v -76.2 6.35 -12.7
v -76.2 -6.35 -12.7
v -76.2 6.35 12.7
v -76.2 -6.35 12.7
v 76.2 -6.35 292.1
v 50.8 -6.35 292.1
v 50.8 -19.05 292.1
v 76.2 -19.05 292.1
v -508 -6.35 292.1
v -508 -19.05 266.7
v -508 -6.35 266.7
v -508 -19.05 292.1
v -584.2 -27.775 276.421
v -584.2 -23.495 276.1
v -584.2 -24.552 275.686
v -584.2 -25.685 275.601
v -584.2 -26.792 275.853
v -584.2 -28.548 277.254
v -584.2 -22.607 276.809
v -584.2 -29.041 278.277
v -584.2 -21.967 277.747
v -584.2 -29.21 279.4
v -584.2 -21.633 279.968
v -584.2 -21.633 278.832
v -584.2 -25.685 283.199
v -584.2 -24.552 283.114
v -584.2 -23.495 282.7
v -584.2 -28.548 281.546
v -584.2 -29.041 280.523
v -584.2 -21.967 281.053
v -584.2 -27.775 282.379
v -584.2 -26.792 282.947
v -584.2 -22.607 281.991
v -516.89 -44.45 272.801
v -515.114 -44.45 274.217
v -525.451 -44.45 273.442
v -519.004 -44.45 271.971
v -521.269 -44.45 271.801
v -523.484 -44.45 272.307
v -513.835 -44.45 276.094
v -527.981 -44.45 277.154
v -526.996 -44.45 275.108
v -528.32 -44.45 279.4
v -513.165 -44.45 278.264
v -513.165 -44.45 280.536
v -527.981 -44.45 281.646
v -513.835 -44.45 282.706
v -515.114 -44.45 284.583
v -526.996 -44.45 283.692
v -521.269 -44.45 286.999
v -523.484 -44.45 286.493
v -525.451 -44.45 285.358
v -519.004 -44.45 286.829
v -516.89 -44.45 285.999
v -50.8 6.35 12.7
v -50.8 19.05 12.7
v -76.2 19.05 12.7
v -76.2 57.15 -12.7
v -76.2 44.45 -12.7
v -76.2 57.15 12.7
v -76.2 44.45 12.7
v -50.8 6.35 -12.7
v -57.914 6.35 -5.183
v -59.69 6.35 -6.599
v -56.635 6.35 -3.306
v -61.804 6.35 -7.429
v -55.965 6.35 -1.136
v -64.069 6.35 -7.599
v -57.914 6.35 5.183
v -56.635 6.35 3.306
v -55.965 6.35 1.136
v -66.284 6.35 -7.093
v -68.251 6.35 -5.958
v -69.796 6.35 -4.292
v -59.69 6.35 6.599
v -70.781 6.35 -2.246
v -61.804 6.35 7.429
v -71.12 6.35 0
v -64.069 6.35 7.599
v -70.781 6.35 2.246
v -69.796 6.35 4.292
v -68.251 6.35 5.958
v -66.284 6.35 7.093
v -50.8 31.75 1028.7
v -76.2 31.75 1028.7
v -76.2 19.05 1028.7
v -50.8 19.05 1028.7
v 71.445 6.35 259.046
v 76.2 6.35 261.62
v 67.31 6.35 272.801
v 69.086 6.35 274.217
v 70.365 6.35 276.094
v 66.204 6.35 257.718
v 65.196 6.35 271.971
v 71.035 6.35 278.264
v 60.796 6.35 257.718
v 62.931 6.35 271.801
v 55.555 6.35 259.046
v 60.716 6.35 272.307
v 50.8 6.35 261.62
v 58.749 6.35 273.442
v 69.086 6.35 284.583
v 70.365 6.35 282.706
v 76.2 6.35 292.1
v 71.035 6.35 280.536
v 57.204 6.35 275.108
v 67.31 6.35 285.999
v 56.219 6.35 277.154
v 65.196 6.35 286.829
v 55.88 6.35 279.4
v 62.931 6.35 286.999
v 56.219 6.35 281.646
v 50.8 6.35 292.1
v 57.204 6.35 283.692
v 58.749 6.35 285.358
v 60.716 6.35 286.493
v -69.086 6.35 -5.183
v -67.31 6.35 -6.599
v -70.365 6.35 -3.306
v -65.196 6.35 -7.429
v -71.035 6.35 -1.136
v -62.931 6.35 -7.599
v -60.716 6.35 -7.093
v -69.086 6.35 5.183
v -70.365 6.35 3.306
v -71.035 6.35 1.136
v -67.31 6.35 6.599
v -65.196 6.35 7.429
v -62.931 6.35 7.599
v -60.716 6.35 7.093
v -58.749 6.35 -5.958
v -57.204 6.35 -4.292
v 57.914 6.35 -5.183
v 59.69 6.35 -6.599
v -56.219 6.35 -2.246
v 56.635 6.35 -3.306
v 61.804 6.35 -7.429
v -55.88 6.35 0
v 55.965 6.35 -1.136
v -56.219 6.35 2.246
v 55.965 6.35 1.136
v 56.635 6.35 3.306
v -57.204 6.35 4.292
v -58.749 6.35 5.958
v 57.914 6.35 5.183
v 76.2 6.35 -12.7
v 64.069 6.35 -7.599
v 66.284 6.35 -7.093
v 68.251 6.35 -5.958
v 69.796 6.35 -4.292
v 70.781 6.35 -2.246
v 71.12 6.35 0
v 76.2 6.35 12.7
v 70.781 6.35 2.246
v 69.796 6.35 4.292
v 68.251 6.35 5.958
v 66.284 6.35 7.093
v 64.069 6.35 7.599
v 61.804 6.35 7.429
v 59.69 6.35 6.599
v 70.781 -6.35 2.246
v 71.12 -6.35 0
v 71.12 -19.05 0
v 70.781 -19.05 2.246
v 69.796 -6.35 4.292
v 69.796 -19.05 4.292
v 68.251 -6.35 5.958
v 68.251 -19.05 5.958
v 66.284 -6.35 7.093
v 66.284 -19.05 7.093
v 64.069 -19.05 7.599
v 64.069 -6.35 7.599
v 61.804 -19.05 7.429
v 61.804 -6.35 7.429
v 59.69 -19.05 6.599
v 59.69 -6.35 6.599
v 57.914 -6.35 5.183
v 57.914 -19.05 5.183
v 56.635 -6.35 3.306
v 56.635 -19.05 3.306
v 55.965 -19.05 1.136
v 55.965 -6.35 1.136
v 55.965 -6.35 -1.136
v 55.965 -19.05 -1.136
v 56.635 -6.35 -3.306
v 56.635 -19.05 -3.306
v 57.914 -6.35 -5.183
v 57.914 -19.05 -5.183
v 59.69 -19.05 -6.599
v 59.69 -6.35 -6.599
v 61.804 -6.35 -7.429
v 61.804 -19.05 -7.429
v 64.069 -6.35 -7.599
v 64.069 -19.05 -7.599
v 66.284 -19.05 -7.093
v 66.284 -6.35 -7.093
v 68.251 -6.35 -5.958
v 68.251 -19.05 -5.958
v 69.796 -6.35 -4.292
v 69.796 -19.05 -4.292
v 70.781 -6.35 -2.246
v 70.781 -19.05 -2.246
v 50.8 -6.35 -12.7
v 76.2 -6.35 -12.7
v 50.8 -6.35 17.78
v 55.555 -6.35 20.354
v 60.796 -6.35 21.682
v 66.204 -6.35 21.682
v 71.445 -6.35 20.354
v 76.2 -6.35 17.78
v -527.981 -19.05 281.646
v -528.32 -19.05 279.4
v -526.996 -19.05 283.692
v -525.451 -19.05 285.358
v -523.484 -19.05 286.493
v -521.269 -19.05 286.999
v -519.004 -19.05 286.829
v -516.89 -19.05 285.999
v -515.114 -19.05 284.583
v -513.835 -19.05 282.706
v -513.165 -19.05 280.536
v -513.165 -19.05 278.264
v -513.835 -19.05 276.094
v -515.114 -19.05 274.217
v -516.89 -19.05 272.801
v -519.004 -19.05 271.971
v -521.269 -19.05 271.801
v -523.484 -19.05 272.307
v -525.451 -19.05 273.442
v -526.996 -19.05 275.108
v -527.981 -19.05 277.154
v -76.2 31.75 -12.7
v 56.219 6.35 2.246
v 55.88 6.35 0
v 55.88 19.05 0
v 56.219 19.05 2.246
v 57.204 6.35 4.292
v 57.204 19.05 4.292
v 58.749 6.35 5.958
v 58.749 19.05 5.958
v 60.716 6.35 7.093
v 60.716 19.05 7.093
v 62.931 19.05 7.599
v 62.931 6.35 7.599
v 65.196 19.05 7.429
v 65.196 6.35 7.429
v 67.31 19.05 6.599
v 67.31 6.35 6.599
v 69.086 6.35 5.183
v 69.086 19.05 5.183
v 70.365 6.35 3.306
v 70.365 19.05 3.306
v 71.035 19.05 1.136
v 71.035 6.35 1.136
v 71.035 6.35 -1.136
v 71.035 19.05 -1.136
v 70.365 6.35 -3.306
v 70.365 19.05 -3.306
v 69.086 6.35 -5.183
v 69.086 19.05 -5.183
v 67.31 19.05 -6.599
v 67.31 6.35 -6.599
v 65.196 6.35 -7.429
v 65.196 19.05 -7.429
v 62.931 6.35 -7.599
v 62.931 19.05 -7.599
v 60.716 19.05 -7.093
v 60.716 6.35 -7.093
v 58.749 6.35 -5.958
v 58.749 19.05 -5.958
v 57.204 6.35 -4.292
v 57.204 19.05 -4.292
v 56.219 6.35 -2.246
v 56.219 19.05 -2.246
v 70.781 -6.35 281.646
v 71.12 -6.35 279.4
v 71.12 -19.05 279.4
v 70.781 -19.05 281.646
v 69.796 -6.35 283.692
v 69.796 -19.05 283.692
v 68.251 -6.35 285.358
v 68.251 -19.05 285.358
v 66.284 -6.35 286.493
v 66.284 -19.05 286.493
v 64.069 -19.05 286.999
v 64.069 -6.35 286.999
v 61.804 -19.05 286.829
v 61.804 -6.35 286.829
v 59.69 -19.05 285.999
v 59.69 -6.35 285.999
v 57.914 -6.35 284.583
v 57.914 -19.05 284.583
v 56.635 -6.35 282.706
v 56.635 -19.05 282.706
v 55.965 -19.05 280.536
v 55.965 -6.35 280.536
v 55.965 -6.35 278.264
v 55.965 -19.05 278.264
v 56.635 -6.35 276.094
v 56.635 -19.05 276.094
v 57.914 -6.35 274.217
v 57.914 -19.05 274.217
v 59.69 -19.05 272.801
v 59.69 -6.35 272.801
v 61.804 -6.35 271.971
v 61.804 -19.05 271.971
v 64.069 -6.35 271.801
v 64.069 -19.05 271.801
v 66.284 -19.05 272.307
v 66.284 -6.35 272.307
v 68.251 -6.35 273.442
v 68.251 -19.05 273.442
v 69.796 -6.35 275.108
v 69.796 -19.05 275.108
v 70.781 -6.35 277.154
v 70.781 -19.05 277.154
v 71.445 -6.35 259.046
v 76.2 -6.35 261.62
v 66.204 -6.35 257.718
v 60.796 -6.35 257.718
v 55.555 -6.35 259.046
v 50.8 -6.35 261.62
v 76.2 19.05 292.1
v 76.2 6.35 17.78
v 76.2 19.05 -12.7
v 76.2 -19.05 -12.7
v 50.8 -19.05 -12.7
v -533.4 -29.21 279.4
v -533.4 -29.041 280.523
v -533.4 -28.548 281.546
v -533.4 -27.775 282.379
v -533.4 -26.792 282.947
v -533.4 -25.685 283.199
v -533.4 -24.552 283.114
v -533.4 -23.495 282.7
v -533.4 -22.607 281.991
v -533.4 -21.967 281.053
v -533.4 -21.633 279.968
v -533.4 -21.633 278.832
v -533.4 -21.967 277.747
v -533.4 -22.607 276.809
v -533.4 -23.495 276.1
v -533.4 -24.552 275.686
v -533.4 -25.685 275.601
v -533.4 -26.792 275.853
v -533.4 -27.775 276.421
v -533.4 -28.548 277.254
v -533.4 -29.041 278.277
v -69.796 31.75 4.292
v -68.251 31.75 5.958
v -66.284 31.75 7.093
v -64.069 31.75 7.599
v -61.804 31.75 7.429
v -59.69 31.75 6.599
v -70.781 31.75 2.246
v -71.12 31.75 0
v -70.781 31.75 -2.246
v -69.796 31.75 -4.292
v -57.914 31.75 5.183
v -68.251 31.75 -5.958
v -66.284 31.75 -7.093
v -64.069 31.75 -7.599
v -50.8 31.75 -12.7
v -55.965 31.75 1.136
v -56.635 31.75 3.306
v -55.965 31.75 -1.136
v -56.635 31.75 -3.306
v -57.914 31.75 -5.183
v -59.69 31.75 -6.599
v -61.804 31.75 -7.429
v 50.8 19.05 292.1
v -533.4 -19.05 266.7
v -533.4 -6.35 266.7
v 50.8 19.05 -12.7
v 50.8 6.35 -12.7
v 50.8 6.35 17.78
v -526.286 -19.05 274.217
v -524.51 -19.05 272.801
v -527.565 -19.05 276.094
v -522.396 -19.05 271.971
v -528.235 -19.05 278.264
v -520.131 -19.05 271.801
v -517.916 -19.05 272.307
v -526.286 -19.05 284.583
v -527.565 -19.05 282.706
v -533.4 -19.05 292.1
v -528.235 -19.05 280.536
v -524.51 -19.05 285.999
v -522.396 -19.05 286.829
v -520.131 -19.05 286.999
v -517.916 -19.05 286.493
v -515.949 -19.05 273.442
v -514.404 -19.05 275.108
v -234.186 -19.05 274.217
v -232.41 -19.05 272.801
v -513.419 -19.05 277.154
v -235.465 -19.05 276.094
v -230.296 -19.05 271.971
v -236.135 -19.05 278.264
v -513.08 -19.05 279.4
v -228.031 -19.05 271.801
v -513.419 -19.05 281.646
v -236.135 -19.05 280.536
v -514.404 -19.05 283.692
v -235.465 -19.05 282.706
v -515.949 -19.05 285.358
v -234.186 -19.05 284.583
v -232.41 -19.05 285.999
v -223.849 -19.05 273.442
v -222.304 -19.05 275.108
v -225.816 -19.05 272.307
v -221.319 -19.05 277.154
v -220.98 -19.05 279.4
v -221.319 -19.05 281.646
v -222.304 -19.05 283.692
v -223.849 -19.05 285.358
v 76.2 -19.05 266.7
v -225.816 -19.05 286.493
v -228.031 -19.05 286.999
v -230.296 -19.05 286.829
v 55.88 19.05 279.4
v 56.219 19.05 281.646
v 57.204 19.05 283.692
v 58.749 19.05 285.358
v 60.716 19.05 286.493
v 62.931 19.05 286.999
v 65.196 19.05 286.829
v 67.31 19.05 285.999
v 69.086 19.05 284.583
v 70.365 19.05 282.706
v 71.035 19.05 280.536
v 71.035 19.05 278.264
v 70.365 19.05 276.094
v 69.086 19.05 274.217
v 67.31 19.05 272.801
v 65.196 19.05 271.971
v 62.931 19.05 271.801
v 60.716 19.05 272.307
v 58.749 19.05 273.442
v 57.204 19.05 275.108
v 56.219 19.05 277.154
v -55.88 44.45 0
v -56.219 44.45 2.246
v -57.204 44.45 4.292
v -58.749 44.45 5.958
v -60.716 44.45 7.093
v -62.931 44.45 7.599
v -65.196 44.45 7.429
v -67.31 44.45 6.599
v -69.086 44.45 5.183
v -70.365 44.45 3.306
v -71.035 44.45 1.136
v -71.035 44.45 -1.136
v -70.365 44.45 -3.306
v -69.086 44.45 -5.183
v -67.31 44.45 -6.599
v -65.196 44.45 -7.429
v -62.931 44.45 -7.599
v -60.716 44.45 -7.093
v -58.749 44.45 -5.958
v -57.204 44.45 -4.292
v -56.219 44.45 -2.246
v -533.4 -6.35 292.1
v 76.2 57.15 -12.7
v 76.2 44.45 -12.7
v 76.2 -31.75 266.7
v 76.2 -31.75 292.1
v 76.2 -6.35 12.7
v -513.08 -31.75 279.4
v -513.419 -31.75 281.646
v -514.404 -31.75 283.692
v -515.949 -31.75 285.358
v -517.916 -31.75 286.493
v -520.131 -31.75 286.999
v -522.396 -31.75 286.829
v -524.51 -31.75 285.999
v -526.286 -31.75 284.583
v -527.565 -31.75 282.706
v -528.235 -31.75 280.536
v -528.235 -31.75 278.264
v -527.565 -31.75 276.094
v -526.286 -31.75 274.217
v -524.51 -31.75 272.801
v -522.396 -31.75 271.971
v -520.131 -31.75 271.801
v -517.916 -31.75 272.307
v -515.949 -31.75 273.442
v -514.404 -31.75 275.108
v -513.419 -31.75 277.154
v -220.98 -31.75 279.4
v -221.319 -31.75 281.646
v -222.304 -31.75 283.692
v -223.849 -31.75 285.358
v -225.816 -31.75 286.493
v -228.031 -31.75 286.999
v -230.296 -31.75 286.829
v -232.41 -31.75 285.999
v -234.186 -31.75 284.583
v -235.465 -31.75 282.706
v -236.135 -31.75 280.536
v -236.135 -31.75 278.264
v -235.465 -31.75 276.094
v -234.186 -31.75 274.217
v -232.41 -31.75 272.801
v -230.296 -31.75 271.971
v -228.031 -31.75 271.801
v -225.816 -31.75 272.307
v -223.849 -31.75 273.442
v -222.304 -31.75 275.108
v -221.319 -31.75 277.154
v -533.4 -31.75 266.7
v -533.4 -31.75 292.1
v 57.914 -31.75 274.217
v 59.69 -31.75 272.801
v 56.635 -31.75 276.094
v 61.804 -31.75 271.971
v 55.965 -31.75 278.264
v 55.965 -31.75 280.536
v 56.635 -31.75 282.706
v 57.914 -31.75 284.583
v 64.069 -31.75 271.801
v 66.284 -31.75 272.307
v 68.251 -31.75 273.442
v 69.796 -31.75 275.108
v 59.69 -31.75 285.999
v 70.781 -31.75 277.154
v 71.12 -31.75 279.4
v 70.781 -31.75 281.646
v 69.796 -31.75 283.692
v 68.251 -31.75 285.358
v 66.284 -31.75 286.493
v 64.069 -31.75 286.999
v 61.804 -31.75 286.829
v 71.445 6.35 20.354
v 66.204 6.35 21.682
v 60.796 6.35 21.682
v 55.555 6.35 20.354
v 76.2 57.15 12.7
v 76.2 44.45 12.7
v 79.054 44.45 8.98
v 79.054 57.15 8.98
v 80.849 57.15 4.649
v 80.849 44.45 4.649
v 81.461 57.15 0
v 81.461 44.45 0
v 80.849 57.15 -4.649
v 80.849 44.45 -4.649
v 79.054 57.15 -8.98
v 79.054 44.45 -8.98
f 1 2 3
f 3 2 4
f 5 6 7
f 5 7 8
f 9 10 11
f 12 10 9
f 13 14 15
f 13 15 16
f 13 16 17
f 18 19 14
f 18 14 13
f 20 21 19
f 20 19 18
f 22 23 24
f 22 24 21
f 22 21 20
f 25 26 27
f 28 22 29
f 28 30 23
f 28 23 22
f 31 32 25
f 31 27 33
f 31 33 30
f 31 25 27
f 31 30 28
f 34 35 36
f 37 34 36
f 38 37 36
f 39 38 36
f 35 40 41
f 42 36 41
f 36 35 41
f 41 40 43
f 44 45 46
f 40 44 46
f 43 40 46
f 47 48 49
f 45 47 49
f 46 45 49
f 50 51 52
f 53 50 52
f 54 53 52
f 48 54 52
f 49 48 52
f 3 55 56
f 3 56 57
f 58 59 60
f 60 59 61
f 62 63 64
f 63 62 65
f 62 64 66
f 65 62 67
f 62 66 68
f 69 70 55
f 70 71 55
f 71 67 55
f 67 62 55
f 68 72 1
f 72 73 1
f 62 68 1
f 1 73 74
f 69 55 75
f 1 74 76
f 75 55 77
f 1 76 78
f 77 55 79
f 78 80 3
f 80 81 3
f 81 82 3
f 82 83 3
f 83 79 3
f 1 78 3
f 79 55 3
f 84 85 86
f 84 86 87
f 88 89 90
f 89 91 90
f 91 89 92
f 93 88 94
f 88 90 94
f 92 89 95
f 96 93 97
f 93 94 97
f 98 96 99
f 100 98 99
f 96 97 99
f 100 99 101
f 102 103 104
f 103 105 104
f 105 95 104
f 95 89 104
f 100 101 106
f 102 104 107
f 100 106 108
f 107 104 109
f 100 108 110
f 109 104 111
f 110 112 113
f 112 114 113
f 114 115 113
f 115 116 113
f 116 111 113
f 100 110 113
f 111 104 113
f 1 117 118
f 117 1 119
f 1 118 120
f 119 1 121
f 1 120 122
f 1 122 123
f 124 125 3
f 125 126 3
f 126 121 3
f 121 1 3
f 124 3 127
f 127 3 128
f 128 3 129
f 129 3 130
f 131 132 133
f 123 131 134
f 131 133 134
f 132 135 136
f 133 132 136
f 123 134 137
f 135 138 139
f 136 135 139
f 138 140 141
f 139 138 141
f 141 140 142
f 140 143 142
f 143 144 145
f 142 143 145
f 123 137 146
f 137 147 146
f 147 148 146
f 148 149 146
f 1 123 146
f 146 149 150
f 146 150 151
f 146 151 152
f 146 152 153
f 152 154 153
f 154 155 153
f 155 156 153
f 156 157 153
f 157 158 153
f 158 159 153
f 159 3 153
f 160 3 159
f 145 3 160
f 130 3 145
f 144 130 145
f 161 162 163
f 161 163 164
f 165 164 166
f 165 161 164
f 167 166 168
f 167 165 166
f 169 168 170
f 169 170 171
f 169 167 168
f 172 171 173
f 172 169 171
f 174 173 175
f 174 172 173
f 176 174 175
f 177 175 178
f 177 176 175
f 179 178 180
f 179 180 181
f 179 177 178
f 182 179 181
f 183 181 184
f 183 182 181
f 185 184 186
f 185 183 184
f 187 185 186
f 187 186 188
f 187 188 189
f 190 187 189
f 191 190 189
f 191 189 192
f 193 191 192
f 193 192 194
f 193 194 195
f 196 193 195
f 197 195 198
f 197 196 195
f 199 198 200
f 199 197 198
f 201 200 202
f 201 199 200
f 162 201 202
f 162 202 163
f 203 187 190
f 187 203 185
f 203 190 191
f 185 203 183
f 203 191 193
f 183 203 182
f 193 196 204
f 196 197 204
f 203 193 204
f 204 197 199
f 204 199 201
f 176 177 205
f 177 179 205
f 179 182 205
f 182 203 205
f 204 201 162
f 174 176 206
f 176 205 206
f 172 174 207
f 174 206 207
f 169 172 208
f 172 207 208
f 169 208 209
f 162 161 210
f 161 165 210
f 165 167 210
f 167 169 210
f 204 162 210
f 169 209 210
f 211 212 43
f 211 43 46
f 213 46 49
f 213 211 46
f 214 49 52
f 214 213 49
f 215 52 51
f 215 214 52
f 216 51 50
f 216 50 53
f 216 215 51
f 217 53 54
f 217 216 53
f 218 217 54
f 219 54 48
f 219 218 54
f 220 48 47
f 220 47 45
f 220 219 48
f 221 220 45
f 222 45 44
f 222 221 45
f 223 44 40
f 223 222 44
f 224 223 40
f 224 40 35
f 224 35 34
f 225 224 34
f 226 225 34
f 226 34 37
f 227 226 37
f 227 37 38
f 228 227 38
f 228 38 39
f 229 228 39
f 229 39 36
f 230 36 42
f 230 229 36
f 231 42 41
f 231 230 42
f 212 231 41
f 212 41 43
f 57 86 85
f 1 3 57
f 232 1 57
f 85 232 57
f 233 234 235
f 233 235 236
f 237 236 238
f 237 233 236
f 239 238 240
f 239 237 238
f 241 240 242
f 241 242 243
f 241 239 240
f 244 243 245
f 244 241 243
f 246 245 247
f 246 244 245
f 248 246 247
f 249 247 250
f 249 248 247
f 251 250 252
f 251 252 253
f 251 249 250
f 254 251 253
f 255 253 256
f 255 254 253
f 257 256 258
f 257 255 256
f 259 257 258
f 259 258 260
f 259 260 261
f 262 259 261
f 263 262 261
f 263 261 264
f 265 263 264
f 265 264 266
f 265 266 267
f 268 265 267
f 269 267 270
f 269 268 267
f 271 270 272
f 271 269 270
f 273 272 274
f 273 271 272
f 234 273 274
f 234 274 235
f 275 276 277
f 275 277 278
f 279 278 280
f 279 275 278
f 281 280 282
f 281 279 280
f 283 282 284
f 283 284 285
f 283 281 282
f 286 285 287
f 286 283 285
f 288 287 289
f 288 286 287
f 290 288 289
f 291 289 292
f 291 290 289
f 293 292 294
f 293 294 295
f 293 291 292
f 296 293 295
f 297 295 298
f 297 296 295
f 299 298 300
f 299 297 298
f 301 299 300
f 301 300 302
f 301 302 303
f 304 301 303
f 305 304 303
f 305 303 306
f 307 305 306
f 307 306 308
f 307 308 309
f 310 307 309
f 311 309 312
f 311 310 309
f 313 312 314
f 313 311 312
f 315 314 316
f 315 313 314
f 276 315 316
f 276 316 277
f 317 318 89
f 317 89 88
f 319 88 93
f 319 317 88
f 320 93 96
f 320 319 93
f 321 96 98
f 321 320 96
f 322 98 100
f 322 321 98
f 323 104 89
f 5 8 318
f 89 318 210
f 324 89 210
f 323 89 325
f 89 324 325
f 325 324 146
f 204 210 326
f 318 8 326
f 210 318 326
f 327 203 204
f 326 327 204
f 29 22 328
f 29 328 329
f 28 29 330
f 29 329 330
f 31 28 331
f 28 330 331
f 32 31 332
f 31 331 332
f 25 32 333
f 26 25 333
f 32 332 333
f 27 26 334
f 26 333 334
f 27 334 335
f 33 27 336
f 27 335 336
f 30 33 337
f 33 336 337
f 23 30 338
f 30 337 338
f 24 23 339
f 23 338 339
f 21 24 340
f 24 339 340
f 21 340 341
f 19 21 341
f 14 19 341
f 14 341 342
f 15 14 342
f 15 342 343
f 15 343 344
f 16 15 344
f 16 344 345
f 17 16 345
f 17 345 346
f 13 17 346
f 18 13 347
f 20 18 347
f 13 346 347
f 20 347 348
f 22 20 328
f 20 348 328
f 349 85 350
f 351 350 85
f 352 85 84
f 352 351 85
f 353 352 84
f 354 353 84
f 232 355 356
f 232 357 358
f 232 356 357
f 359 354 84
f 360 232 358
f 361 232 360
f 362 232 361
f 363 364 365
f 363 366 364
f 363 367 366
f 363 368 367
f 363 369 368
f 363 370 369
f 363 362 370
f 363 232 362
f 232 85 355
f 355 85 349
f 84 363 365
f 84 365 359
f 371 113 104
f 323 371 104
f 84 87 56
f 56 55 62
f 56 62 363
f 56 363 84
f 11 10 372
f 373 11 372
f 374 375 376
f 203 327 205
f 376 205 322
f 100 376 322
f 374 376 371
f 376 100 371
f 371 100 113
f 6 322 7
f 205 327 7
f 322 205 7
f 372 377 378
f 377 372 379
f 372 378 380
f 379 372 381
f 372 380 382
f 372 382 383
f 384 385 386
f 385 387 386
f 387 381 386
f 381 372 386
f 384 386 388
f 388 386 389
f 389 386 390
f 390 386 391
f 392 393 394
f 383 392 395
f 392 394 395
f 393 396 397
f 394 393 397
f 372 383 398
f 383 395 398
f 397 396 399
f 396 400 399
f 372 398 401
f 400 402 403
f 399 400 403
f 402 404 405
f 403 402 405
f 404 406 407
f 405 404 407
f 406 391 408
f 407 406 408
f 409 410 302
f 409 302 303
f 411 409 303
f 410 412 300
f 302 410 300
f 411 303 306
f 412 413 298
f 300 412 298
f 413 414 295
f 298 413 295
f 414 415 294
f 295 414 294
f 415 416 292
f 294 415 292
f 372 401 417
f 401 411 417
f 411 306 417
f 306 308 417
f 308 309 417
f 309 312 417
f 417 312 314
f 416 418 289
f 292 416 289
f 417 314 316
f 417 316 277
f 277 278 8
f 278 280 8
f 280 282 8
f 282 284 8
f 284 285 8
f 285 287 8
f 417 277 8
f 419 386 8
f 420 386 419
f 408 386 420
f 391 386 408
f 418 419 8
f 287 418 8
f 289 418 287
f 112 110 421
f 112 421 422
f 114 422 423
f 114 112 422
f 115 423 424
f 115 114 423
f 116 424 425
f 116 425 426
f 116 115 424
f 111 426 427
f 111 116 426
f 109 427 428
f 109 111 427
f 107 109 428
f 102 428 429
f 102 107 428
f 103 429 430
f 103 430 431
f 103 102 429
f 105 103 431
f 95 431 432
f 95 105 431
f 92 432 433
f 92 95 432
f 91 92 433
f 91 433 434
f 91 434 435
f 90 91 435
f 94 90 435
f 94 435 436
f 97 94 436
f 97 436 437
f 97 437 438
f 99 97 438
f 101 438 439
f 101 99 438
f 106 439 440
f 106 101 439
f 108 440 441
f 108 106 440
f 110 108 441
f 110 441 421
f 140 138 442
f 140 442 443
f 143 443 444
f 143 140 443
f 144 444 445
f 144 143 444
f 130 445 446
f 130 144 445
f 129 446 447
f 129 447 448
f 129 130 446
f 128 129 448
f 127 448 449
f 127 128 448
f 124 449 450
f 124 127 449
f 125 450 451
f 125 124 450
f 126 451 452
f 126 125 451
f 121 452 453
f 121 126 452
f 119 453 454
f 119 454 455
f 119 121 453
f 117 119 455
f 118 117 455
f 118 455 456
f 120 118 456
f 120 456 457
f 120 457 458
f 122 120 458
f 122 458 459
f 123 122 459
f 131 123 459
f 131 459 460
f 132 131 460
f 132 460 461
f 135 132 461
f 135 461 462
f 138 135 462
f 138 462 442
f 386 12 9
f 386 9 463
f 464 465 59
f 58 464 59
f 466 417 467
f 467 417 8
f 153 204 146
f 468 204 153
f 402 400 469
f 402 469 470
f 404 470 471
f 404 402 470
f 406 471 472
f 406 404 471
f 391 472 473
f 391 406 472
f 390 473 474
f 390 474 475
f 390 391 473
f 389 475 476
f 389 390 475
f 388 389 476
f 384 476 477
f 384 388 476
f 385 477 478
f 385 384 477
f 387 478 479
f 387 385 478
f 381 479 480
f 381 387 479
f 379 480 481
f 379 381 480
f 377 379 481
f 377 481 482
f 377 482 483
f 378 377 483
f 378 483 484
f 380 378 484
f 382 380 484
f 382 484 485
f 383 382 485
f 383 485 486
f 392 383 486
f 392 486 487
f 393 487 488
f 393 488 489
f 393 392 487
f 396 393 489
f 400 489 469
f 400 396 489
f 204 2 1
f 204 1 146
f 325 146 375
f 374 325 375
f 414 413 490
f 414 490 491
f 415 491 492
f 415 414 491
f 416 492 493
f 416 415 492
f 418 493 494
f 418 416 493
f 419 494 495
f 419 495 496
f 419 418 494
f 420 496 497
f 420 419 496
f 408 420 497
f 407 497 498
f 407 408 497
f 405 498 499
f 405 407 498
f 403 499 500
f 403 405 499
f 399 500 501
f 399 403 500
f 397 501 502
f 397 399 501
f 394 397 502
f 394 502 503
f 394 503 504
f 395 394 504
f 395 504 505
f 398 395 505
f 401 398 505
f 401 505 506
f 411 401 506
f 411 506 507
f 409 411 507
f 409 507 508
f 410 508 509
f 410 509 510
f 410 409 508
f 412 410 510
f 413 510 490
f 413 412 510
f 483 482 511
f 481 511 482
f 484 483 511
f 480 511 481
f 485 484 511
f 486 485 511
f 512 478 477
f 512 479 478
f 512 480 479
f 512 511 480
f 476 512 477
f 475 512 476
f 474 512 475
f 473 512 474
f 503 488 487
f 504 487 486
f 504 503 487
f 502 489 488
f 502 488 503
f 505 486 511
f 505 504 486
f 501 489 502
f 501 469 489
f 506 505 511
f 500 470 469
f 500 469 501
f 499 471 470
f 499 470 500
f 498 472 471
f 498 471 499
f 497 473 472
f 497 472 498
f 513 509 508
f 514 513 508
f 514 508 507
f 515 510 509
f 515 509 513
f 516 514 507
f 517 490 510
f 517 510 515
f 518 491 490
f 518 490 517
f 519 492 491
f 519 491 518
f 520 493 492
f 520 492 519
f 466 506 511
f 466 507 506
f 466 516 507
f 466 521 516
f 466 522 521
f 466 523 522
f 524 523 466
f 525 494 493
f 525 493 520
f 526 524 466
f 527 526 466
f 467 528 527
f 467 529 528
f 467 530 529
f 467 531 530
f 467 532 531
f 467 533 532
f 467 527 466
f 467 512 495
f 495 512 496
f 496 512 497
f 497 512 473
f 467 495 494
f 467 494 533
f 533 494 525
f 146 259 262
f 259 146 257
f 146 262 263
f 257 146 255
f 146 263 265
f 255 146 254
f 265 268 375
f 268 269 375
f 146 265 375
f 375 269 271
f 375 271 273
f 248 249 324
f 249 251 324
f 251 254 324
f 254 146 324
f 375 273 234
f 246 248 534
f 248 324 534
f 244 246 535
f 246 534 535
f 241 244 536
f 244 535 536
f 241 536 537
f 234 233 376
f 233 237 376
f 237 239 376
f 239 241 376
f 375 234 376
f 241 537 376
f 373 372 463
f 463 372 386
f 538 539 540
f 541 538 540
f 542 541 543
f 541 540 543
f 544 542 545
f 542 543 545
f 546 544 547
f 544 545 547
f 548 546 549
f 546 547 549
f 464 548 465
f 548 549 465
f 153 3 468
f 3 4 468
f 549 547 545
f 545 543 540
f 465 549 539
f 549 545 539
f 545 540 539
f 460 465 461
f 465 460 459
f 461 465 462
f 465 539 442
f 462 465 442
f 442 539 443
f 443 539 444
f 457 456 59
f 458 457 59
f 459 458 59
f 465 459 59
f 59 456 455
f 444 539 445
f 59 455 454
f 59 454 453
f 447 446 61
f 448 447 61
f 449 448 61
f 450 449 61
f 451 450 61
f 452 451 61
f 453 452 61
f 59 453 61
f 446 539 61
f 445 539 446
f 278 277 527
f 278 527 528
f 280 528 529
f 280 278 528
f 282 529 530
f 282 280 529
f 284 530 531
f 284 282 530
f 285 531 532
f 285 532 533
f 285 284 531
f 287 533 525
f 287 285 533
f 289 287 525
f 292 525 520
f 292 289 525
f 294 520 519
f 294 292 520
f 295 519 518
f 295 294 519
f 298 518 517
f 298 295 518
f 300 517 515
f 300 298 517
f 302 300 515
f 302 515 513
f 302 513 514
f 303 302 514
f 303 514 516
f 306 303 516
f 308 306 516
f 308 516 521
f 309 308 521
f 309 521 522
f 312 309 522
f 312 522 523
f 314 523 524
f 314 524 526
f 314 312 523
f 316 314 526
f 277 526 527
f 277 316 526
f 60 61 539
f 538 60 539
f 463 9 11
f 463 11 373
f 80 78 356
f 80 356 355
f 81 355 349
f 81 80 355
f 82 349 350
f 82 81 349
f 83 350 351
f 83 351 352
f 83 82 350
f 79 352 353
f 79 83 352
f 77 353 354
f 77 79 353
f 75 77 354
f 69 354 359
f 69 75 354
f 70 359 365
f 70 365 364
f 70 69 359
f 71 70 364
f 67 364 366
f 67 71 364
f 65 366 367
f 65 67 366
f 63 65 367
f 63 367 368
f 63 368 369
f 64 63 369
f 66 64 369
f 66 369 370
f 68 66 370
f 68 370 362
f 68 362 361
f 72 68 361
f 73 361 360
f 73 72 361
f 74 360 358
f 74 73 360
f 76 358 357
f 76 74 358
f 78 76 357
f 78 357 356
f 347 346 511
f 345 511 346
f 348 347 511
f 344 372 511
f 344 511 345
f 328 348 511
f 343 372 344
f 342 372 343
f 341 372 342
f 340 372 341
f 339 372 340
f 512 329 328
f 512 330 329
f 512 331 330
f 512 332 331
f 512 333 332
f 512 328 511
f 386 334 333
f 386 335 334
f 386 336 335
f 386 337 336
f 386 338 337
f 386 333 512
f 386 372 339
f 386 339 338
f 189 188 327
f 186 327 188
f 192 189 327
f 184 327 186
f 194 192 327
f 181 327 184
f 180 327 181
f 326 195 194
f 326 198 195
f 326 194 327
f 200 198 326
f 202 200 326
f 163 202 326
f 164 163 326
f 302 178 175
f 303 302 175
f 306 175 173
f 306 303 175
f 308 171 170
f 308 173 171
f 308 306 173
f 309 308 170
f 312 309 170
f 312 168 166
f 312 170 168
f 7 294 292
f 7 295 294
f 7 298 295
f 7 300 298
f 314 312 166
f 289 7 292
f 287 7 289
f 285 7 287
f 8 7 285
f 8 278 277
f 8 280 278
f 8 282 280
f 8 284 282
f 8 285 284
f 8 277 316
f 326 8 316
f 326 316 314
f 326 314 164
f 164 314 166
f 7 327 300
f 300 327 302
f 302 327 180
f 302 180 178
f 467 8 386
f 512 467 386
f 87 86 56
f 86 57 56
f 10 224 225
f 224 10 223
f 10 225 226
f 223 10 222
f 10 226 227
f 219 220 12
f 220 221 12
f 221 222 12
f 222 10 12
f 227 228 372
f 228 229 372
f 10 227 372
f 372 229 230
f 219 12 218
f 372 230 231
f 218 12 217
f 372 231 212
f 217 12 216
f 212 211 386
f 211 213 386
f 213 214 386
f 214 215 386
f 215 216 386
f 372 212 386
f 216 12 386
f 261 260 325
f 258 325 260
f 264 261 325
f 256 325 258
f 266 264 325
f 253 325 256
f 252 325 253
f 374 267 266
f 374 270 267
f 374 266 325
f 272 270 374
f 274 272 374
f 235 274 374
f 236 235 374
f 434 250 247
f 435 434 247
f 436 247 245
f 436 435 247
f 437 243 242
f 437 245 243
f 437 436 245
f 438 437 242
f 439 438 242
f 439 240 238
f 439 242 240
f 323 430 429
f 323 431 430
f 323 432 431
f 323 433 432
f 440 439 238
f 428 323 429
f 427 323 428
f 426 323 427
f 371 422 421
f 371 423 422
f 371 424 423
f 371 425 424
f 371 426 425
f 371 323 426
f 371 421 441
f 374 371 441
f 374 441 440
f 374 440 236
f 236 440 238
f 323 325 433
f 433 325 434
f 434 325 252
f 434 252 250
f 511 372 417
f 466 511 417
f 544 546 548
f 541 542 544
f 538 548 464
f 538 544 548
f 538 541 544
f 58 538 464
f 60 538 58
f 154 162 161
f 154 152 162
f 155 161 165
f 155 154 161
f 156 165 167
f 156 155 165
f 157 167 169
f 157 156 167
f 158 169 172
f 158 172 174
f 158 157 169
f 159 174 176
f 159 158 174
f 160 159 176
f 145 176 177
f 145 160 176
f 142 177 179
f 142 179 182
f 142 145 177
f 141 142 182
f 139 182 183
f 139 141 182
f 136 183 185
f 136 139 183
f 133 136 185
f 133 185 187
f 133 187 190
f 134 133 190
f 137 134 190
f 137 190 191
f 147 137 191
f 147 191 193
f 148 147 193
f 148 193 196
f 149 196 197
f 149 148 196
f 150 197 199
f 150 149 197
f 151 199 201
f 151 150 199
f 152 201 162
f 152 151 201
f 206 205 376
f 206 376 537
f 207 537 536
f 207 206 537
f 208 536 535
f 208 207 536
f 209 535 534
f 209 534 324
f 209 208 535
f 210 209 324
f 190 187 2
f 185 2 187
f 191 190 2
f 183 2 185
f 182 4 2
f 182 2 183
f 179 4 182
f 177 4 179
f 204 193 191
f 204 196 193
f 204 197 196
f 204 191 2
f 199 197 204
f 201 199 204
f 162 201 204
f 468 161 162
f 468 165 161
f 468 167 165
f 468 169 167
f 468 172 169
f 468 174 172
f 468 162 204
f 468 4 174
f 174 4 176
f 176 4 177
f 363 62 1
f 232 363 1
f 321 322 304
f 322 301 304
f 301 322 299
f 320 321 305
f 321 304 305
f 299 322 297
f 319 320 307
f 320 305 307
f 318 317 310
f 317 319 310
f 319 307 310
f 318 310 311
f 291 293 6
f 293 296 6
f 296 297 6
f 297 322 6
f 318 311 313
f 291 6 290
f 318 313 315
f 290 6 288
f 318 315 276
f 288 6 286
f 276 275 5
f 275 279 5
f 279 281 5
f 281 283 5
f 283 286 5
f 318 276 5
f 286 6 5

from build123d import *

# Parameters (mm, degrees)
F0_W      = 152.4
F0_H      = 25.4
F0_R      = 7.62
F1_DEPTH  = 6.35
F2_W      = 25.4
F2_H      = 25.4
F2_R      = 7.62
F2_H_2    = 279.4
F3_DEPTH  = 12.7
F5_DEPTH  = 12.7
F6_R      = 7.62
F7_DEPTH  = 12.7
F8_W      = 584.2
F8_H      = 25.4
F8_R      = 7.62
F8_W_2    = 25.4
F9_DEPTH  = 12.7
F10_W     = 25.4
F10_H     = 25.4
F10_R     = 7.62
F11_DEPTH = 25.4
F12_DEPTH = 25.4
F13_W     = 25.4
F13_H     = 12.7
F14_DEPTH = 889
F15_W     = 25.4
F15_H     = 25.4
F15_R     = 7.62
F16_DEPTH = 12.7
F17_DEPTH = 25.4
F18_DEPTH = 127
F19_R     = 3.81
F20_DEPTH = 50.8
F21_DEPTH = 65.024
F22_R     = 7.62
F23_DEPTH = 50.8
F24_R     = 7.62
F25_DEPTH = 12.7


with BuildPart() as f1:
    # F0 (on Front) → F1 (new body, symmetric)
    with BuildSketch(Plane.XZ):
        Rectangle(F0_W, F0_H)
        with Locations((-63.5, 0)):
            Circle(F0_R, mode=Mode.SUBTRACT)
        with Locations((63.5, 0)):
            Circle(F0_R, mode=Mode.SUBTRACT)
    extrude(amount=F1_DEPTH, both=True)

    # F22 (on face) → F23 (join)
    with BuildSketch(Plane.XZ.offset(6.35)):
        with Locations((-63.5, 0)):
            Circle(F22_R)
    extrude(amount=-F23_DEPTH)

    # F24 (on face) → F25 (join)
    with BuildSketch(Plane(origin=(0, 44.45, 0), x_dir=(-1, 0, 0), z_dir=(0, 1, 0))):
        with BuildLine():
            Line((76.2, 12.7), (-76.2, 12.7))
            ThreePointArc((-76.2, 12.7), (-81.4605122421, 0), (-76.2, -12.7))
            Line((-76.2, -12.7), (76.2, -12.7))
            Line((76.2, -12.7), (76.2, 12.7))
        make_face()
        with Locations((63.5, 0)):
            Circle(F24_R, mode=Mode.SUBTRACT)
        with Locations((63.5, 0)):
            Circle(F24_R)
    extrude(amount=F25_DEPTH)


with BuildPart() as f3:
    # F2 (on face) → F3 (new body)
    with BuildSketch(Plane.XZ.offset(6.35)):
        with Locations((63.5, 0)):
            Rectangle(F2_W, F2_H)
        with Locations((63.5, 0)):
            Circle(F2_R, mode=Mode.SUBTRACT)
        with Locations((63.5, 152.4)):
            Rectangle(F2_W, F2_H_2)
        with Locations((63.5, 279.4)):
            Circle(F2_R, mode=Mode.SUBTRACT)
    extrude(amount=F3_DEPTH)

    # F4 (on face) → F5 (join, through all)
    with BuildSketch(Plane.XZ.offset(6.35)):
        with BuildLine():
            Line((50.8, 261.62), (50.8, 17.78))
            ThreePointArc((50.8, 17.78), (63.5, 21.8499061783), (76.2, 17.78))
            Line((76.2, 17.78), (76.2, 261.62))
            ThreePointArc((76.2, 261.62), (63.5, 257.5500938217), (50.8, 261.62))
        make_face()
    extrude(amount=-F5_DEPTH)

    # F6 (on face) → F7 (join)
    with BuildSketch(Plane(origin=(0, 6.35, 0), x_dir=(-1, 0, 0), z_dir=(0, 1, 0))):
        with BuildLine():
            Line((-76.2, -12.7), (-50.8, -12.7))
            Line((-50.8, -12.7), (-50.8, 17.78))
            ThreePointArc((-50.8, 17.78), (-63.5, 21.8499061783), (-76.2, 17.78))
            Line((-76.2, 17.78), (-76.2, -12.7))
        make_face()
        with Locations((-63.5, 0)):
            Circle(F6_R, mode=Mode.SUBTRACT)
        with BuildLine():
            ThreePointArc((-76.2, 17.78), (-63.5, 21.8499061783), (-50.8, 17.78))
            Line((-50.8, 17.78), (-50.8, 261.62))
            ThreePointArc((-50.8, 261.62), (-63.5, 257.5500938217), (-76.2, 261.62))
            Line((-76.2, 261.62), (-76.2, 17.78))
        make_face()
        with BuildLine():
            ThreePointArc((-76.2, 261.62), (-63.5, 257.5500938217), (-50.8, 261.62))
            Line((-50.8, 261.62), (-50.8, 292.1))
            Line((-50.8, 292.1), (-76.2, 292.1))
            Line((-76.2, 292.1), (-76.2, 261.62))
        make_face()
        with Locations((-63.5, 279.4)):
            Circle(F6_R, mode=Mode.SUBTRACT)
    extrude(amount=F7_DEPTH)


with BuildPart() as f9:
    # F8 (on face) → F9 (new body)
    with BuildSketch(Plane.XZ.offset(19.05)):
        with Locations((-241.3, 279.4)):
            Rectangle(F8_W, F8_H)
        with Locations((-520.7, 279.4)):
            Circle(F8_R, mode=Mode.SUBTRACT)
        with Locations((-228.6, 279.4)):
            Circle(F8_R, mode=Mode.SUBTRACT)
        with Locations((63.5, 279.4)):
            Rectangle(F8_W_2, F8_H)
        with Locations((63.5, 279.4)):
            Circle(F8_R, mode=Mode.SUBTRACT)
    extrude(amount=F9_DEPTH)

    # F19 (on face) → F20 (join)
    with BuildSketch(Plane(origin=(-533.4, 0, 0), x_dir=(0, -1, 0), z_dir=(-1, 0, 0))):
        with Locations((25.4, 279.4)):
            Circle(F19_R)
    extrude(amount=F20_DEPTH)


with BuildPart() as f11:
    # F10 (on face) → F11 (new body)
    with BuildSketch(Plane(origin=(0, 6.35, 0), x_dir=(-1, 0, 0), z_dir=(0, 1, 0))):
        with Locations((63.5, 0)):
            Rectangle(F10_W, F10_H)
        with Locations((63.5, 0)):
            Circle(F10_R, mode=Mode.SUBTRACT)
    extrude(amount=-F11_DEPTH)

    # F21 (cut): a face of the model
    f21_faces = [f11.faces().sort_by_distance(p)[0] for p in [
        (-75.8407897552, -19.05, 0),
    ]]
    extrude(f21_faces, amount=-F21_DEPTH, mode=Mode.SUBTRACT)


with BuildPart() as f12:
    # F10 (on face) → F12 (new body)
    with BuildSketch(Plane(origin=(0, 6.35, 0), x_dir=(-1, 0, 0), z_dir=(0, 1, 0))):
        with Locations((63.5, 0)):
            Rectangle(F10_W, F10_H)
        with Locations((63.5, 0)):
            Circle(F10_R, mode=Mode.SUBTRACT)
    extrude(amount=F12_DEPTH)

    # F13 (on face) → F14 (join)
    with BuildSketch(Plane.XY.offset(12.7)):
        with Locations((-63.5, 25.4)):
            Rectangle(F13_W, F13_H)
    extrude(amount=F14_DEPTH)

    # F18 (add): a face of the model
    f18_faces = [f12.faces().sort_by_distance(p)[0] for p in [
        (-63.5, 25.4, 901.7),
    ]]
    extrude(f18_faces, amount=F18_DEPTH)


with BuildPart() as f16:
    # F15 (on face) → F16 (new body)
    with BuildSketch(Plane(origin=(0, -19.05, 0), x_dir=(-1, 0, 0), z_dir=(0, 1, 0))):
        with Locations((520.7, 279.4)):
            Rectangle(F15_W, F15_H)
        with Locations((520.7, 279.4)):
            Circle(F15_R, mode=Mode.SUBTRACT)
        with Locations((520.7, 279.4)):
            Circle(F15_R)
    extrude(amount=F16_DEPTH)

    # F15 (on face) → F17 (join)
    with BuildSketch(Plane(origin=(0, -19.05, 0), x_dir=(-1, 0, 0), z_dir=(0, 1, 0))):
        with Locations((520.7, 279.4)):
            Circle(F15_R)
    extrude(amount=-F17_DEPTH)


solid = Compound([f1.part, f3.part, f9.part, f12.part, f16.part])
